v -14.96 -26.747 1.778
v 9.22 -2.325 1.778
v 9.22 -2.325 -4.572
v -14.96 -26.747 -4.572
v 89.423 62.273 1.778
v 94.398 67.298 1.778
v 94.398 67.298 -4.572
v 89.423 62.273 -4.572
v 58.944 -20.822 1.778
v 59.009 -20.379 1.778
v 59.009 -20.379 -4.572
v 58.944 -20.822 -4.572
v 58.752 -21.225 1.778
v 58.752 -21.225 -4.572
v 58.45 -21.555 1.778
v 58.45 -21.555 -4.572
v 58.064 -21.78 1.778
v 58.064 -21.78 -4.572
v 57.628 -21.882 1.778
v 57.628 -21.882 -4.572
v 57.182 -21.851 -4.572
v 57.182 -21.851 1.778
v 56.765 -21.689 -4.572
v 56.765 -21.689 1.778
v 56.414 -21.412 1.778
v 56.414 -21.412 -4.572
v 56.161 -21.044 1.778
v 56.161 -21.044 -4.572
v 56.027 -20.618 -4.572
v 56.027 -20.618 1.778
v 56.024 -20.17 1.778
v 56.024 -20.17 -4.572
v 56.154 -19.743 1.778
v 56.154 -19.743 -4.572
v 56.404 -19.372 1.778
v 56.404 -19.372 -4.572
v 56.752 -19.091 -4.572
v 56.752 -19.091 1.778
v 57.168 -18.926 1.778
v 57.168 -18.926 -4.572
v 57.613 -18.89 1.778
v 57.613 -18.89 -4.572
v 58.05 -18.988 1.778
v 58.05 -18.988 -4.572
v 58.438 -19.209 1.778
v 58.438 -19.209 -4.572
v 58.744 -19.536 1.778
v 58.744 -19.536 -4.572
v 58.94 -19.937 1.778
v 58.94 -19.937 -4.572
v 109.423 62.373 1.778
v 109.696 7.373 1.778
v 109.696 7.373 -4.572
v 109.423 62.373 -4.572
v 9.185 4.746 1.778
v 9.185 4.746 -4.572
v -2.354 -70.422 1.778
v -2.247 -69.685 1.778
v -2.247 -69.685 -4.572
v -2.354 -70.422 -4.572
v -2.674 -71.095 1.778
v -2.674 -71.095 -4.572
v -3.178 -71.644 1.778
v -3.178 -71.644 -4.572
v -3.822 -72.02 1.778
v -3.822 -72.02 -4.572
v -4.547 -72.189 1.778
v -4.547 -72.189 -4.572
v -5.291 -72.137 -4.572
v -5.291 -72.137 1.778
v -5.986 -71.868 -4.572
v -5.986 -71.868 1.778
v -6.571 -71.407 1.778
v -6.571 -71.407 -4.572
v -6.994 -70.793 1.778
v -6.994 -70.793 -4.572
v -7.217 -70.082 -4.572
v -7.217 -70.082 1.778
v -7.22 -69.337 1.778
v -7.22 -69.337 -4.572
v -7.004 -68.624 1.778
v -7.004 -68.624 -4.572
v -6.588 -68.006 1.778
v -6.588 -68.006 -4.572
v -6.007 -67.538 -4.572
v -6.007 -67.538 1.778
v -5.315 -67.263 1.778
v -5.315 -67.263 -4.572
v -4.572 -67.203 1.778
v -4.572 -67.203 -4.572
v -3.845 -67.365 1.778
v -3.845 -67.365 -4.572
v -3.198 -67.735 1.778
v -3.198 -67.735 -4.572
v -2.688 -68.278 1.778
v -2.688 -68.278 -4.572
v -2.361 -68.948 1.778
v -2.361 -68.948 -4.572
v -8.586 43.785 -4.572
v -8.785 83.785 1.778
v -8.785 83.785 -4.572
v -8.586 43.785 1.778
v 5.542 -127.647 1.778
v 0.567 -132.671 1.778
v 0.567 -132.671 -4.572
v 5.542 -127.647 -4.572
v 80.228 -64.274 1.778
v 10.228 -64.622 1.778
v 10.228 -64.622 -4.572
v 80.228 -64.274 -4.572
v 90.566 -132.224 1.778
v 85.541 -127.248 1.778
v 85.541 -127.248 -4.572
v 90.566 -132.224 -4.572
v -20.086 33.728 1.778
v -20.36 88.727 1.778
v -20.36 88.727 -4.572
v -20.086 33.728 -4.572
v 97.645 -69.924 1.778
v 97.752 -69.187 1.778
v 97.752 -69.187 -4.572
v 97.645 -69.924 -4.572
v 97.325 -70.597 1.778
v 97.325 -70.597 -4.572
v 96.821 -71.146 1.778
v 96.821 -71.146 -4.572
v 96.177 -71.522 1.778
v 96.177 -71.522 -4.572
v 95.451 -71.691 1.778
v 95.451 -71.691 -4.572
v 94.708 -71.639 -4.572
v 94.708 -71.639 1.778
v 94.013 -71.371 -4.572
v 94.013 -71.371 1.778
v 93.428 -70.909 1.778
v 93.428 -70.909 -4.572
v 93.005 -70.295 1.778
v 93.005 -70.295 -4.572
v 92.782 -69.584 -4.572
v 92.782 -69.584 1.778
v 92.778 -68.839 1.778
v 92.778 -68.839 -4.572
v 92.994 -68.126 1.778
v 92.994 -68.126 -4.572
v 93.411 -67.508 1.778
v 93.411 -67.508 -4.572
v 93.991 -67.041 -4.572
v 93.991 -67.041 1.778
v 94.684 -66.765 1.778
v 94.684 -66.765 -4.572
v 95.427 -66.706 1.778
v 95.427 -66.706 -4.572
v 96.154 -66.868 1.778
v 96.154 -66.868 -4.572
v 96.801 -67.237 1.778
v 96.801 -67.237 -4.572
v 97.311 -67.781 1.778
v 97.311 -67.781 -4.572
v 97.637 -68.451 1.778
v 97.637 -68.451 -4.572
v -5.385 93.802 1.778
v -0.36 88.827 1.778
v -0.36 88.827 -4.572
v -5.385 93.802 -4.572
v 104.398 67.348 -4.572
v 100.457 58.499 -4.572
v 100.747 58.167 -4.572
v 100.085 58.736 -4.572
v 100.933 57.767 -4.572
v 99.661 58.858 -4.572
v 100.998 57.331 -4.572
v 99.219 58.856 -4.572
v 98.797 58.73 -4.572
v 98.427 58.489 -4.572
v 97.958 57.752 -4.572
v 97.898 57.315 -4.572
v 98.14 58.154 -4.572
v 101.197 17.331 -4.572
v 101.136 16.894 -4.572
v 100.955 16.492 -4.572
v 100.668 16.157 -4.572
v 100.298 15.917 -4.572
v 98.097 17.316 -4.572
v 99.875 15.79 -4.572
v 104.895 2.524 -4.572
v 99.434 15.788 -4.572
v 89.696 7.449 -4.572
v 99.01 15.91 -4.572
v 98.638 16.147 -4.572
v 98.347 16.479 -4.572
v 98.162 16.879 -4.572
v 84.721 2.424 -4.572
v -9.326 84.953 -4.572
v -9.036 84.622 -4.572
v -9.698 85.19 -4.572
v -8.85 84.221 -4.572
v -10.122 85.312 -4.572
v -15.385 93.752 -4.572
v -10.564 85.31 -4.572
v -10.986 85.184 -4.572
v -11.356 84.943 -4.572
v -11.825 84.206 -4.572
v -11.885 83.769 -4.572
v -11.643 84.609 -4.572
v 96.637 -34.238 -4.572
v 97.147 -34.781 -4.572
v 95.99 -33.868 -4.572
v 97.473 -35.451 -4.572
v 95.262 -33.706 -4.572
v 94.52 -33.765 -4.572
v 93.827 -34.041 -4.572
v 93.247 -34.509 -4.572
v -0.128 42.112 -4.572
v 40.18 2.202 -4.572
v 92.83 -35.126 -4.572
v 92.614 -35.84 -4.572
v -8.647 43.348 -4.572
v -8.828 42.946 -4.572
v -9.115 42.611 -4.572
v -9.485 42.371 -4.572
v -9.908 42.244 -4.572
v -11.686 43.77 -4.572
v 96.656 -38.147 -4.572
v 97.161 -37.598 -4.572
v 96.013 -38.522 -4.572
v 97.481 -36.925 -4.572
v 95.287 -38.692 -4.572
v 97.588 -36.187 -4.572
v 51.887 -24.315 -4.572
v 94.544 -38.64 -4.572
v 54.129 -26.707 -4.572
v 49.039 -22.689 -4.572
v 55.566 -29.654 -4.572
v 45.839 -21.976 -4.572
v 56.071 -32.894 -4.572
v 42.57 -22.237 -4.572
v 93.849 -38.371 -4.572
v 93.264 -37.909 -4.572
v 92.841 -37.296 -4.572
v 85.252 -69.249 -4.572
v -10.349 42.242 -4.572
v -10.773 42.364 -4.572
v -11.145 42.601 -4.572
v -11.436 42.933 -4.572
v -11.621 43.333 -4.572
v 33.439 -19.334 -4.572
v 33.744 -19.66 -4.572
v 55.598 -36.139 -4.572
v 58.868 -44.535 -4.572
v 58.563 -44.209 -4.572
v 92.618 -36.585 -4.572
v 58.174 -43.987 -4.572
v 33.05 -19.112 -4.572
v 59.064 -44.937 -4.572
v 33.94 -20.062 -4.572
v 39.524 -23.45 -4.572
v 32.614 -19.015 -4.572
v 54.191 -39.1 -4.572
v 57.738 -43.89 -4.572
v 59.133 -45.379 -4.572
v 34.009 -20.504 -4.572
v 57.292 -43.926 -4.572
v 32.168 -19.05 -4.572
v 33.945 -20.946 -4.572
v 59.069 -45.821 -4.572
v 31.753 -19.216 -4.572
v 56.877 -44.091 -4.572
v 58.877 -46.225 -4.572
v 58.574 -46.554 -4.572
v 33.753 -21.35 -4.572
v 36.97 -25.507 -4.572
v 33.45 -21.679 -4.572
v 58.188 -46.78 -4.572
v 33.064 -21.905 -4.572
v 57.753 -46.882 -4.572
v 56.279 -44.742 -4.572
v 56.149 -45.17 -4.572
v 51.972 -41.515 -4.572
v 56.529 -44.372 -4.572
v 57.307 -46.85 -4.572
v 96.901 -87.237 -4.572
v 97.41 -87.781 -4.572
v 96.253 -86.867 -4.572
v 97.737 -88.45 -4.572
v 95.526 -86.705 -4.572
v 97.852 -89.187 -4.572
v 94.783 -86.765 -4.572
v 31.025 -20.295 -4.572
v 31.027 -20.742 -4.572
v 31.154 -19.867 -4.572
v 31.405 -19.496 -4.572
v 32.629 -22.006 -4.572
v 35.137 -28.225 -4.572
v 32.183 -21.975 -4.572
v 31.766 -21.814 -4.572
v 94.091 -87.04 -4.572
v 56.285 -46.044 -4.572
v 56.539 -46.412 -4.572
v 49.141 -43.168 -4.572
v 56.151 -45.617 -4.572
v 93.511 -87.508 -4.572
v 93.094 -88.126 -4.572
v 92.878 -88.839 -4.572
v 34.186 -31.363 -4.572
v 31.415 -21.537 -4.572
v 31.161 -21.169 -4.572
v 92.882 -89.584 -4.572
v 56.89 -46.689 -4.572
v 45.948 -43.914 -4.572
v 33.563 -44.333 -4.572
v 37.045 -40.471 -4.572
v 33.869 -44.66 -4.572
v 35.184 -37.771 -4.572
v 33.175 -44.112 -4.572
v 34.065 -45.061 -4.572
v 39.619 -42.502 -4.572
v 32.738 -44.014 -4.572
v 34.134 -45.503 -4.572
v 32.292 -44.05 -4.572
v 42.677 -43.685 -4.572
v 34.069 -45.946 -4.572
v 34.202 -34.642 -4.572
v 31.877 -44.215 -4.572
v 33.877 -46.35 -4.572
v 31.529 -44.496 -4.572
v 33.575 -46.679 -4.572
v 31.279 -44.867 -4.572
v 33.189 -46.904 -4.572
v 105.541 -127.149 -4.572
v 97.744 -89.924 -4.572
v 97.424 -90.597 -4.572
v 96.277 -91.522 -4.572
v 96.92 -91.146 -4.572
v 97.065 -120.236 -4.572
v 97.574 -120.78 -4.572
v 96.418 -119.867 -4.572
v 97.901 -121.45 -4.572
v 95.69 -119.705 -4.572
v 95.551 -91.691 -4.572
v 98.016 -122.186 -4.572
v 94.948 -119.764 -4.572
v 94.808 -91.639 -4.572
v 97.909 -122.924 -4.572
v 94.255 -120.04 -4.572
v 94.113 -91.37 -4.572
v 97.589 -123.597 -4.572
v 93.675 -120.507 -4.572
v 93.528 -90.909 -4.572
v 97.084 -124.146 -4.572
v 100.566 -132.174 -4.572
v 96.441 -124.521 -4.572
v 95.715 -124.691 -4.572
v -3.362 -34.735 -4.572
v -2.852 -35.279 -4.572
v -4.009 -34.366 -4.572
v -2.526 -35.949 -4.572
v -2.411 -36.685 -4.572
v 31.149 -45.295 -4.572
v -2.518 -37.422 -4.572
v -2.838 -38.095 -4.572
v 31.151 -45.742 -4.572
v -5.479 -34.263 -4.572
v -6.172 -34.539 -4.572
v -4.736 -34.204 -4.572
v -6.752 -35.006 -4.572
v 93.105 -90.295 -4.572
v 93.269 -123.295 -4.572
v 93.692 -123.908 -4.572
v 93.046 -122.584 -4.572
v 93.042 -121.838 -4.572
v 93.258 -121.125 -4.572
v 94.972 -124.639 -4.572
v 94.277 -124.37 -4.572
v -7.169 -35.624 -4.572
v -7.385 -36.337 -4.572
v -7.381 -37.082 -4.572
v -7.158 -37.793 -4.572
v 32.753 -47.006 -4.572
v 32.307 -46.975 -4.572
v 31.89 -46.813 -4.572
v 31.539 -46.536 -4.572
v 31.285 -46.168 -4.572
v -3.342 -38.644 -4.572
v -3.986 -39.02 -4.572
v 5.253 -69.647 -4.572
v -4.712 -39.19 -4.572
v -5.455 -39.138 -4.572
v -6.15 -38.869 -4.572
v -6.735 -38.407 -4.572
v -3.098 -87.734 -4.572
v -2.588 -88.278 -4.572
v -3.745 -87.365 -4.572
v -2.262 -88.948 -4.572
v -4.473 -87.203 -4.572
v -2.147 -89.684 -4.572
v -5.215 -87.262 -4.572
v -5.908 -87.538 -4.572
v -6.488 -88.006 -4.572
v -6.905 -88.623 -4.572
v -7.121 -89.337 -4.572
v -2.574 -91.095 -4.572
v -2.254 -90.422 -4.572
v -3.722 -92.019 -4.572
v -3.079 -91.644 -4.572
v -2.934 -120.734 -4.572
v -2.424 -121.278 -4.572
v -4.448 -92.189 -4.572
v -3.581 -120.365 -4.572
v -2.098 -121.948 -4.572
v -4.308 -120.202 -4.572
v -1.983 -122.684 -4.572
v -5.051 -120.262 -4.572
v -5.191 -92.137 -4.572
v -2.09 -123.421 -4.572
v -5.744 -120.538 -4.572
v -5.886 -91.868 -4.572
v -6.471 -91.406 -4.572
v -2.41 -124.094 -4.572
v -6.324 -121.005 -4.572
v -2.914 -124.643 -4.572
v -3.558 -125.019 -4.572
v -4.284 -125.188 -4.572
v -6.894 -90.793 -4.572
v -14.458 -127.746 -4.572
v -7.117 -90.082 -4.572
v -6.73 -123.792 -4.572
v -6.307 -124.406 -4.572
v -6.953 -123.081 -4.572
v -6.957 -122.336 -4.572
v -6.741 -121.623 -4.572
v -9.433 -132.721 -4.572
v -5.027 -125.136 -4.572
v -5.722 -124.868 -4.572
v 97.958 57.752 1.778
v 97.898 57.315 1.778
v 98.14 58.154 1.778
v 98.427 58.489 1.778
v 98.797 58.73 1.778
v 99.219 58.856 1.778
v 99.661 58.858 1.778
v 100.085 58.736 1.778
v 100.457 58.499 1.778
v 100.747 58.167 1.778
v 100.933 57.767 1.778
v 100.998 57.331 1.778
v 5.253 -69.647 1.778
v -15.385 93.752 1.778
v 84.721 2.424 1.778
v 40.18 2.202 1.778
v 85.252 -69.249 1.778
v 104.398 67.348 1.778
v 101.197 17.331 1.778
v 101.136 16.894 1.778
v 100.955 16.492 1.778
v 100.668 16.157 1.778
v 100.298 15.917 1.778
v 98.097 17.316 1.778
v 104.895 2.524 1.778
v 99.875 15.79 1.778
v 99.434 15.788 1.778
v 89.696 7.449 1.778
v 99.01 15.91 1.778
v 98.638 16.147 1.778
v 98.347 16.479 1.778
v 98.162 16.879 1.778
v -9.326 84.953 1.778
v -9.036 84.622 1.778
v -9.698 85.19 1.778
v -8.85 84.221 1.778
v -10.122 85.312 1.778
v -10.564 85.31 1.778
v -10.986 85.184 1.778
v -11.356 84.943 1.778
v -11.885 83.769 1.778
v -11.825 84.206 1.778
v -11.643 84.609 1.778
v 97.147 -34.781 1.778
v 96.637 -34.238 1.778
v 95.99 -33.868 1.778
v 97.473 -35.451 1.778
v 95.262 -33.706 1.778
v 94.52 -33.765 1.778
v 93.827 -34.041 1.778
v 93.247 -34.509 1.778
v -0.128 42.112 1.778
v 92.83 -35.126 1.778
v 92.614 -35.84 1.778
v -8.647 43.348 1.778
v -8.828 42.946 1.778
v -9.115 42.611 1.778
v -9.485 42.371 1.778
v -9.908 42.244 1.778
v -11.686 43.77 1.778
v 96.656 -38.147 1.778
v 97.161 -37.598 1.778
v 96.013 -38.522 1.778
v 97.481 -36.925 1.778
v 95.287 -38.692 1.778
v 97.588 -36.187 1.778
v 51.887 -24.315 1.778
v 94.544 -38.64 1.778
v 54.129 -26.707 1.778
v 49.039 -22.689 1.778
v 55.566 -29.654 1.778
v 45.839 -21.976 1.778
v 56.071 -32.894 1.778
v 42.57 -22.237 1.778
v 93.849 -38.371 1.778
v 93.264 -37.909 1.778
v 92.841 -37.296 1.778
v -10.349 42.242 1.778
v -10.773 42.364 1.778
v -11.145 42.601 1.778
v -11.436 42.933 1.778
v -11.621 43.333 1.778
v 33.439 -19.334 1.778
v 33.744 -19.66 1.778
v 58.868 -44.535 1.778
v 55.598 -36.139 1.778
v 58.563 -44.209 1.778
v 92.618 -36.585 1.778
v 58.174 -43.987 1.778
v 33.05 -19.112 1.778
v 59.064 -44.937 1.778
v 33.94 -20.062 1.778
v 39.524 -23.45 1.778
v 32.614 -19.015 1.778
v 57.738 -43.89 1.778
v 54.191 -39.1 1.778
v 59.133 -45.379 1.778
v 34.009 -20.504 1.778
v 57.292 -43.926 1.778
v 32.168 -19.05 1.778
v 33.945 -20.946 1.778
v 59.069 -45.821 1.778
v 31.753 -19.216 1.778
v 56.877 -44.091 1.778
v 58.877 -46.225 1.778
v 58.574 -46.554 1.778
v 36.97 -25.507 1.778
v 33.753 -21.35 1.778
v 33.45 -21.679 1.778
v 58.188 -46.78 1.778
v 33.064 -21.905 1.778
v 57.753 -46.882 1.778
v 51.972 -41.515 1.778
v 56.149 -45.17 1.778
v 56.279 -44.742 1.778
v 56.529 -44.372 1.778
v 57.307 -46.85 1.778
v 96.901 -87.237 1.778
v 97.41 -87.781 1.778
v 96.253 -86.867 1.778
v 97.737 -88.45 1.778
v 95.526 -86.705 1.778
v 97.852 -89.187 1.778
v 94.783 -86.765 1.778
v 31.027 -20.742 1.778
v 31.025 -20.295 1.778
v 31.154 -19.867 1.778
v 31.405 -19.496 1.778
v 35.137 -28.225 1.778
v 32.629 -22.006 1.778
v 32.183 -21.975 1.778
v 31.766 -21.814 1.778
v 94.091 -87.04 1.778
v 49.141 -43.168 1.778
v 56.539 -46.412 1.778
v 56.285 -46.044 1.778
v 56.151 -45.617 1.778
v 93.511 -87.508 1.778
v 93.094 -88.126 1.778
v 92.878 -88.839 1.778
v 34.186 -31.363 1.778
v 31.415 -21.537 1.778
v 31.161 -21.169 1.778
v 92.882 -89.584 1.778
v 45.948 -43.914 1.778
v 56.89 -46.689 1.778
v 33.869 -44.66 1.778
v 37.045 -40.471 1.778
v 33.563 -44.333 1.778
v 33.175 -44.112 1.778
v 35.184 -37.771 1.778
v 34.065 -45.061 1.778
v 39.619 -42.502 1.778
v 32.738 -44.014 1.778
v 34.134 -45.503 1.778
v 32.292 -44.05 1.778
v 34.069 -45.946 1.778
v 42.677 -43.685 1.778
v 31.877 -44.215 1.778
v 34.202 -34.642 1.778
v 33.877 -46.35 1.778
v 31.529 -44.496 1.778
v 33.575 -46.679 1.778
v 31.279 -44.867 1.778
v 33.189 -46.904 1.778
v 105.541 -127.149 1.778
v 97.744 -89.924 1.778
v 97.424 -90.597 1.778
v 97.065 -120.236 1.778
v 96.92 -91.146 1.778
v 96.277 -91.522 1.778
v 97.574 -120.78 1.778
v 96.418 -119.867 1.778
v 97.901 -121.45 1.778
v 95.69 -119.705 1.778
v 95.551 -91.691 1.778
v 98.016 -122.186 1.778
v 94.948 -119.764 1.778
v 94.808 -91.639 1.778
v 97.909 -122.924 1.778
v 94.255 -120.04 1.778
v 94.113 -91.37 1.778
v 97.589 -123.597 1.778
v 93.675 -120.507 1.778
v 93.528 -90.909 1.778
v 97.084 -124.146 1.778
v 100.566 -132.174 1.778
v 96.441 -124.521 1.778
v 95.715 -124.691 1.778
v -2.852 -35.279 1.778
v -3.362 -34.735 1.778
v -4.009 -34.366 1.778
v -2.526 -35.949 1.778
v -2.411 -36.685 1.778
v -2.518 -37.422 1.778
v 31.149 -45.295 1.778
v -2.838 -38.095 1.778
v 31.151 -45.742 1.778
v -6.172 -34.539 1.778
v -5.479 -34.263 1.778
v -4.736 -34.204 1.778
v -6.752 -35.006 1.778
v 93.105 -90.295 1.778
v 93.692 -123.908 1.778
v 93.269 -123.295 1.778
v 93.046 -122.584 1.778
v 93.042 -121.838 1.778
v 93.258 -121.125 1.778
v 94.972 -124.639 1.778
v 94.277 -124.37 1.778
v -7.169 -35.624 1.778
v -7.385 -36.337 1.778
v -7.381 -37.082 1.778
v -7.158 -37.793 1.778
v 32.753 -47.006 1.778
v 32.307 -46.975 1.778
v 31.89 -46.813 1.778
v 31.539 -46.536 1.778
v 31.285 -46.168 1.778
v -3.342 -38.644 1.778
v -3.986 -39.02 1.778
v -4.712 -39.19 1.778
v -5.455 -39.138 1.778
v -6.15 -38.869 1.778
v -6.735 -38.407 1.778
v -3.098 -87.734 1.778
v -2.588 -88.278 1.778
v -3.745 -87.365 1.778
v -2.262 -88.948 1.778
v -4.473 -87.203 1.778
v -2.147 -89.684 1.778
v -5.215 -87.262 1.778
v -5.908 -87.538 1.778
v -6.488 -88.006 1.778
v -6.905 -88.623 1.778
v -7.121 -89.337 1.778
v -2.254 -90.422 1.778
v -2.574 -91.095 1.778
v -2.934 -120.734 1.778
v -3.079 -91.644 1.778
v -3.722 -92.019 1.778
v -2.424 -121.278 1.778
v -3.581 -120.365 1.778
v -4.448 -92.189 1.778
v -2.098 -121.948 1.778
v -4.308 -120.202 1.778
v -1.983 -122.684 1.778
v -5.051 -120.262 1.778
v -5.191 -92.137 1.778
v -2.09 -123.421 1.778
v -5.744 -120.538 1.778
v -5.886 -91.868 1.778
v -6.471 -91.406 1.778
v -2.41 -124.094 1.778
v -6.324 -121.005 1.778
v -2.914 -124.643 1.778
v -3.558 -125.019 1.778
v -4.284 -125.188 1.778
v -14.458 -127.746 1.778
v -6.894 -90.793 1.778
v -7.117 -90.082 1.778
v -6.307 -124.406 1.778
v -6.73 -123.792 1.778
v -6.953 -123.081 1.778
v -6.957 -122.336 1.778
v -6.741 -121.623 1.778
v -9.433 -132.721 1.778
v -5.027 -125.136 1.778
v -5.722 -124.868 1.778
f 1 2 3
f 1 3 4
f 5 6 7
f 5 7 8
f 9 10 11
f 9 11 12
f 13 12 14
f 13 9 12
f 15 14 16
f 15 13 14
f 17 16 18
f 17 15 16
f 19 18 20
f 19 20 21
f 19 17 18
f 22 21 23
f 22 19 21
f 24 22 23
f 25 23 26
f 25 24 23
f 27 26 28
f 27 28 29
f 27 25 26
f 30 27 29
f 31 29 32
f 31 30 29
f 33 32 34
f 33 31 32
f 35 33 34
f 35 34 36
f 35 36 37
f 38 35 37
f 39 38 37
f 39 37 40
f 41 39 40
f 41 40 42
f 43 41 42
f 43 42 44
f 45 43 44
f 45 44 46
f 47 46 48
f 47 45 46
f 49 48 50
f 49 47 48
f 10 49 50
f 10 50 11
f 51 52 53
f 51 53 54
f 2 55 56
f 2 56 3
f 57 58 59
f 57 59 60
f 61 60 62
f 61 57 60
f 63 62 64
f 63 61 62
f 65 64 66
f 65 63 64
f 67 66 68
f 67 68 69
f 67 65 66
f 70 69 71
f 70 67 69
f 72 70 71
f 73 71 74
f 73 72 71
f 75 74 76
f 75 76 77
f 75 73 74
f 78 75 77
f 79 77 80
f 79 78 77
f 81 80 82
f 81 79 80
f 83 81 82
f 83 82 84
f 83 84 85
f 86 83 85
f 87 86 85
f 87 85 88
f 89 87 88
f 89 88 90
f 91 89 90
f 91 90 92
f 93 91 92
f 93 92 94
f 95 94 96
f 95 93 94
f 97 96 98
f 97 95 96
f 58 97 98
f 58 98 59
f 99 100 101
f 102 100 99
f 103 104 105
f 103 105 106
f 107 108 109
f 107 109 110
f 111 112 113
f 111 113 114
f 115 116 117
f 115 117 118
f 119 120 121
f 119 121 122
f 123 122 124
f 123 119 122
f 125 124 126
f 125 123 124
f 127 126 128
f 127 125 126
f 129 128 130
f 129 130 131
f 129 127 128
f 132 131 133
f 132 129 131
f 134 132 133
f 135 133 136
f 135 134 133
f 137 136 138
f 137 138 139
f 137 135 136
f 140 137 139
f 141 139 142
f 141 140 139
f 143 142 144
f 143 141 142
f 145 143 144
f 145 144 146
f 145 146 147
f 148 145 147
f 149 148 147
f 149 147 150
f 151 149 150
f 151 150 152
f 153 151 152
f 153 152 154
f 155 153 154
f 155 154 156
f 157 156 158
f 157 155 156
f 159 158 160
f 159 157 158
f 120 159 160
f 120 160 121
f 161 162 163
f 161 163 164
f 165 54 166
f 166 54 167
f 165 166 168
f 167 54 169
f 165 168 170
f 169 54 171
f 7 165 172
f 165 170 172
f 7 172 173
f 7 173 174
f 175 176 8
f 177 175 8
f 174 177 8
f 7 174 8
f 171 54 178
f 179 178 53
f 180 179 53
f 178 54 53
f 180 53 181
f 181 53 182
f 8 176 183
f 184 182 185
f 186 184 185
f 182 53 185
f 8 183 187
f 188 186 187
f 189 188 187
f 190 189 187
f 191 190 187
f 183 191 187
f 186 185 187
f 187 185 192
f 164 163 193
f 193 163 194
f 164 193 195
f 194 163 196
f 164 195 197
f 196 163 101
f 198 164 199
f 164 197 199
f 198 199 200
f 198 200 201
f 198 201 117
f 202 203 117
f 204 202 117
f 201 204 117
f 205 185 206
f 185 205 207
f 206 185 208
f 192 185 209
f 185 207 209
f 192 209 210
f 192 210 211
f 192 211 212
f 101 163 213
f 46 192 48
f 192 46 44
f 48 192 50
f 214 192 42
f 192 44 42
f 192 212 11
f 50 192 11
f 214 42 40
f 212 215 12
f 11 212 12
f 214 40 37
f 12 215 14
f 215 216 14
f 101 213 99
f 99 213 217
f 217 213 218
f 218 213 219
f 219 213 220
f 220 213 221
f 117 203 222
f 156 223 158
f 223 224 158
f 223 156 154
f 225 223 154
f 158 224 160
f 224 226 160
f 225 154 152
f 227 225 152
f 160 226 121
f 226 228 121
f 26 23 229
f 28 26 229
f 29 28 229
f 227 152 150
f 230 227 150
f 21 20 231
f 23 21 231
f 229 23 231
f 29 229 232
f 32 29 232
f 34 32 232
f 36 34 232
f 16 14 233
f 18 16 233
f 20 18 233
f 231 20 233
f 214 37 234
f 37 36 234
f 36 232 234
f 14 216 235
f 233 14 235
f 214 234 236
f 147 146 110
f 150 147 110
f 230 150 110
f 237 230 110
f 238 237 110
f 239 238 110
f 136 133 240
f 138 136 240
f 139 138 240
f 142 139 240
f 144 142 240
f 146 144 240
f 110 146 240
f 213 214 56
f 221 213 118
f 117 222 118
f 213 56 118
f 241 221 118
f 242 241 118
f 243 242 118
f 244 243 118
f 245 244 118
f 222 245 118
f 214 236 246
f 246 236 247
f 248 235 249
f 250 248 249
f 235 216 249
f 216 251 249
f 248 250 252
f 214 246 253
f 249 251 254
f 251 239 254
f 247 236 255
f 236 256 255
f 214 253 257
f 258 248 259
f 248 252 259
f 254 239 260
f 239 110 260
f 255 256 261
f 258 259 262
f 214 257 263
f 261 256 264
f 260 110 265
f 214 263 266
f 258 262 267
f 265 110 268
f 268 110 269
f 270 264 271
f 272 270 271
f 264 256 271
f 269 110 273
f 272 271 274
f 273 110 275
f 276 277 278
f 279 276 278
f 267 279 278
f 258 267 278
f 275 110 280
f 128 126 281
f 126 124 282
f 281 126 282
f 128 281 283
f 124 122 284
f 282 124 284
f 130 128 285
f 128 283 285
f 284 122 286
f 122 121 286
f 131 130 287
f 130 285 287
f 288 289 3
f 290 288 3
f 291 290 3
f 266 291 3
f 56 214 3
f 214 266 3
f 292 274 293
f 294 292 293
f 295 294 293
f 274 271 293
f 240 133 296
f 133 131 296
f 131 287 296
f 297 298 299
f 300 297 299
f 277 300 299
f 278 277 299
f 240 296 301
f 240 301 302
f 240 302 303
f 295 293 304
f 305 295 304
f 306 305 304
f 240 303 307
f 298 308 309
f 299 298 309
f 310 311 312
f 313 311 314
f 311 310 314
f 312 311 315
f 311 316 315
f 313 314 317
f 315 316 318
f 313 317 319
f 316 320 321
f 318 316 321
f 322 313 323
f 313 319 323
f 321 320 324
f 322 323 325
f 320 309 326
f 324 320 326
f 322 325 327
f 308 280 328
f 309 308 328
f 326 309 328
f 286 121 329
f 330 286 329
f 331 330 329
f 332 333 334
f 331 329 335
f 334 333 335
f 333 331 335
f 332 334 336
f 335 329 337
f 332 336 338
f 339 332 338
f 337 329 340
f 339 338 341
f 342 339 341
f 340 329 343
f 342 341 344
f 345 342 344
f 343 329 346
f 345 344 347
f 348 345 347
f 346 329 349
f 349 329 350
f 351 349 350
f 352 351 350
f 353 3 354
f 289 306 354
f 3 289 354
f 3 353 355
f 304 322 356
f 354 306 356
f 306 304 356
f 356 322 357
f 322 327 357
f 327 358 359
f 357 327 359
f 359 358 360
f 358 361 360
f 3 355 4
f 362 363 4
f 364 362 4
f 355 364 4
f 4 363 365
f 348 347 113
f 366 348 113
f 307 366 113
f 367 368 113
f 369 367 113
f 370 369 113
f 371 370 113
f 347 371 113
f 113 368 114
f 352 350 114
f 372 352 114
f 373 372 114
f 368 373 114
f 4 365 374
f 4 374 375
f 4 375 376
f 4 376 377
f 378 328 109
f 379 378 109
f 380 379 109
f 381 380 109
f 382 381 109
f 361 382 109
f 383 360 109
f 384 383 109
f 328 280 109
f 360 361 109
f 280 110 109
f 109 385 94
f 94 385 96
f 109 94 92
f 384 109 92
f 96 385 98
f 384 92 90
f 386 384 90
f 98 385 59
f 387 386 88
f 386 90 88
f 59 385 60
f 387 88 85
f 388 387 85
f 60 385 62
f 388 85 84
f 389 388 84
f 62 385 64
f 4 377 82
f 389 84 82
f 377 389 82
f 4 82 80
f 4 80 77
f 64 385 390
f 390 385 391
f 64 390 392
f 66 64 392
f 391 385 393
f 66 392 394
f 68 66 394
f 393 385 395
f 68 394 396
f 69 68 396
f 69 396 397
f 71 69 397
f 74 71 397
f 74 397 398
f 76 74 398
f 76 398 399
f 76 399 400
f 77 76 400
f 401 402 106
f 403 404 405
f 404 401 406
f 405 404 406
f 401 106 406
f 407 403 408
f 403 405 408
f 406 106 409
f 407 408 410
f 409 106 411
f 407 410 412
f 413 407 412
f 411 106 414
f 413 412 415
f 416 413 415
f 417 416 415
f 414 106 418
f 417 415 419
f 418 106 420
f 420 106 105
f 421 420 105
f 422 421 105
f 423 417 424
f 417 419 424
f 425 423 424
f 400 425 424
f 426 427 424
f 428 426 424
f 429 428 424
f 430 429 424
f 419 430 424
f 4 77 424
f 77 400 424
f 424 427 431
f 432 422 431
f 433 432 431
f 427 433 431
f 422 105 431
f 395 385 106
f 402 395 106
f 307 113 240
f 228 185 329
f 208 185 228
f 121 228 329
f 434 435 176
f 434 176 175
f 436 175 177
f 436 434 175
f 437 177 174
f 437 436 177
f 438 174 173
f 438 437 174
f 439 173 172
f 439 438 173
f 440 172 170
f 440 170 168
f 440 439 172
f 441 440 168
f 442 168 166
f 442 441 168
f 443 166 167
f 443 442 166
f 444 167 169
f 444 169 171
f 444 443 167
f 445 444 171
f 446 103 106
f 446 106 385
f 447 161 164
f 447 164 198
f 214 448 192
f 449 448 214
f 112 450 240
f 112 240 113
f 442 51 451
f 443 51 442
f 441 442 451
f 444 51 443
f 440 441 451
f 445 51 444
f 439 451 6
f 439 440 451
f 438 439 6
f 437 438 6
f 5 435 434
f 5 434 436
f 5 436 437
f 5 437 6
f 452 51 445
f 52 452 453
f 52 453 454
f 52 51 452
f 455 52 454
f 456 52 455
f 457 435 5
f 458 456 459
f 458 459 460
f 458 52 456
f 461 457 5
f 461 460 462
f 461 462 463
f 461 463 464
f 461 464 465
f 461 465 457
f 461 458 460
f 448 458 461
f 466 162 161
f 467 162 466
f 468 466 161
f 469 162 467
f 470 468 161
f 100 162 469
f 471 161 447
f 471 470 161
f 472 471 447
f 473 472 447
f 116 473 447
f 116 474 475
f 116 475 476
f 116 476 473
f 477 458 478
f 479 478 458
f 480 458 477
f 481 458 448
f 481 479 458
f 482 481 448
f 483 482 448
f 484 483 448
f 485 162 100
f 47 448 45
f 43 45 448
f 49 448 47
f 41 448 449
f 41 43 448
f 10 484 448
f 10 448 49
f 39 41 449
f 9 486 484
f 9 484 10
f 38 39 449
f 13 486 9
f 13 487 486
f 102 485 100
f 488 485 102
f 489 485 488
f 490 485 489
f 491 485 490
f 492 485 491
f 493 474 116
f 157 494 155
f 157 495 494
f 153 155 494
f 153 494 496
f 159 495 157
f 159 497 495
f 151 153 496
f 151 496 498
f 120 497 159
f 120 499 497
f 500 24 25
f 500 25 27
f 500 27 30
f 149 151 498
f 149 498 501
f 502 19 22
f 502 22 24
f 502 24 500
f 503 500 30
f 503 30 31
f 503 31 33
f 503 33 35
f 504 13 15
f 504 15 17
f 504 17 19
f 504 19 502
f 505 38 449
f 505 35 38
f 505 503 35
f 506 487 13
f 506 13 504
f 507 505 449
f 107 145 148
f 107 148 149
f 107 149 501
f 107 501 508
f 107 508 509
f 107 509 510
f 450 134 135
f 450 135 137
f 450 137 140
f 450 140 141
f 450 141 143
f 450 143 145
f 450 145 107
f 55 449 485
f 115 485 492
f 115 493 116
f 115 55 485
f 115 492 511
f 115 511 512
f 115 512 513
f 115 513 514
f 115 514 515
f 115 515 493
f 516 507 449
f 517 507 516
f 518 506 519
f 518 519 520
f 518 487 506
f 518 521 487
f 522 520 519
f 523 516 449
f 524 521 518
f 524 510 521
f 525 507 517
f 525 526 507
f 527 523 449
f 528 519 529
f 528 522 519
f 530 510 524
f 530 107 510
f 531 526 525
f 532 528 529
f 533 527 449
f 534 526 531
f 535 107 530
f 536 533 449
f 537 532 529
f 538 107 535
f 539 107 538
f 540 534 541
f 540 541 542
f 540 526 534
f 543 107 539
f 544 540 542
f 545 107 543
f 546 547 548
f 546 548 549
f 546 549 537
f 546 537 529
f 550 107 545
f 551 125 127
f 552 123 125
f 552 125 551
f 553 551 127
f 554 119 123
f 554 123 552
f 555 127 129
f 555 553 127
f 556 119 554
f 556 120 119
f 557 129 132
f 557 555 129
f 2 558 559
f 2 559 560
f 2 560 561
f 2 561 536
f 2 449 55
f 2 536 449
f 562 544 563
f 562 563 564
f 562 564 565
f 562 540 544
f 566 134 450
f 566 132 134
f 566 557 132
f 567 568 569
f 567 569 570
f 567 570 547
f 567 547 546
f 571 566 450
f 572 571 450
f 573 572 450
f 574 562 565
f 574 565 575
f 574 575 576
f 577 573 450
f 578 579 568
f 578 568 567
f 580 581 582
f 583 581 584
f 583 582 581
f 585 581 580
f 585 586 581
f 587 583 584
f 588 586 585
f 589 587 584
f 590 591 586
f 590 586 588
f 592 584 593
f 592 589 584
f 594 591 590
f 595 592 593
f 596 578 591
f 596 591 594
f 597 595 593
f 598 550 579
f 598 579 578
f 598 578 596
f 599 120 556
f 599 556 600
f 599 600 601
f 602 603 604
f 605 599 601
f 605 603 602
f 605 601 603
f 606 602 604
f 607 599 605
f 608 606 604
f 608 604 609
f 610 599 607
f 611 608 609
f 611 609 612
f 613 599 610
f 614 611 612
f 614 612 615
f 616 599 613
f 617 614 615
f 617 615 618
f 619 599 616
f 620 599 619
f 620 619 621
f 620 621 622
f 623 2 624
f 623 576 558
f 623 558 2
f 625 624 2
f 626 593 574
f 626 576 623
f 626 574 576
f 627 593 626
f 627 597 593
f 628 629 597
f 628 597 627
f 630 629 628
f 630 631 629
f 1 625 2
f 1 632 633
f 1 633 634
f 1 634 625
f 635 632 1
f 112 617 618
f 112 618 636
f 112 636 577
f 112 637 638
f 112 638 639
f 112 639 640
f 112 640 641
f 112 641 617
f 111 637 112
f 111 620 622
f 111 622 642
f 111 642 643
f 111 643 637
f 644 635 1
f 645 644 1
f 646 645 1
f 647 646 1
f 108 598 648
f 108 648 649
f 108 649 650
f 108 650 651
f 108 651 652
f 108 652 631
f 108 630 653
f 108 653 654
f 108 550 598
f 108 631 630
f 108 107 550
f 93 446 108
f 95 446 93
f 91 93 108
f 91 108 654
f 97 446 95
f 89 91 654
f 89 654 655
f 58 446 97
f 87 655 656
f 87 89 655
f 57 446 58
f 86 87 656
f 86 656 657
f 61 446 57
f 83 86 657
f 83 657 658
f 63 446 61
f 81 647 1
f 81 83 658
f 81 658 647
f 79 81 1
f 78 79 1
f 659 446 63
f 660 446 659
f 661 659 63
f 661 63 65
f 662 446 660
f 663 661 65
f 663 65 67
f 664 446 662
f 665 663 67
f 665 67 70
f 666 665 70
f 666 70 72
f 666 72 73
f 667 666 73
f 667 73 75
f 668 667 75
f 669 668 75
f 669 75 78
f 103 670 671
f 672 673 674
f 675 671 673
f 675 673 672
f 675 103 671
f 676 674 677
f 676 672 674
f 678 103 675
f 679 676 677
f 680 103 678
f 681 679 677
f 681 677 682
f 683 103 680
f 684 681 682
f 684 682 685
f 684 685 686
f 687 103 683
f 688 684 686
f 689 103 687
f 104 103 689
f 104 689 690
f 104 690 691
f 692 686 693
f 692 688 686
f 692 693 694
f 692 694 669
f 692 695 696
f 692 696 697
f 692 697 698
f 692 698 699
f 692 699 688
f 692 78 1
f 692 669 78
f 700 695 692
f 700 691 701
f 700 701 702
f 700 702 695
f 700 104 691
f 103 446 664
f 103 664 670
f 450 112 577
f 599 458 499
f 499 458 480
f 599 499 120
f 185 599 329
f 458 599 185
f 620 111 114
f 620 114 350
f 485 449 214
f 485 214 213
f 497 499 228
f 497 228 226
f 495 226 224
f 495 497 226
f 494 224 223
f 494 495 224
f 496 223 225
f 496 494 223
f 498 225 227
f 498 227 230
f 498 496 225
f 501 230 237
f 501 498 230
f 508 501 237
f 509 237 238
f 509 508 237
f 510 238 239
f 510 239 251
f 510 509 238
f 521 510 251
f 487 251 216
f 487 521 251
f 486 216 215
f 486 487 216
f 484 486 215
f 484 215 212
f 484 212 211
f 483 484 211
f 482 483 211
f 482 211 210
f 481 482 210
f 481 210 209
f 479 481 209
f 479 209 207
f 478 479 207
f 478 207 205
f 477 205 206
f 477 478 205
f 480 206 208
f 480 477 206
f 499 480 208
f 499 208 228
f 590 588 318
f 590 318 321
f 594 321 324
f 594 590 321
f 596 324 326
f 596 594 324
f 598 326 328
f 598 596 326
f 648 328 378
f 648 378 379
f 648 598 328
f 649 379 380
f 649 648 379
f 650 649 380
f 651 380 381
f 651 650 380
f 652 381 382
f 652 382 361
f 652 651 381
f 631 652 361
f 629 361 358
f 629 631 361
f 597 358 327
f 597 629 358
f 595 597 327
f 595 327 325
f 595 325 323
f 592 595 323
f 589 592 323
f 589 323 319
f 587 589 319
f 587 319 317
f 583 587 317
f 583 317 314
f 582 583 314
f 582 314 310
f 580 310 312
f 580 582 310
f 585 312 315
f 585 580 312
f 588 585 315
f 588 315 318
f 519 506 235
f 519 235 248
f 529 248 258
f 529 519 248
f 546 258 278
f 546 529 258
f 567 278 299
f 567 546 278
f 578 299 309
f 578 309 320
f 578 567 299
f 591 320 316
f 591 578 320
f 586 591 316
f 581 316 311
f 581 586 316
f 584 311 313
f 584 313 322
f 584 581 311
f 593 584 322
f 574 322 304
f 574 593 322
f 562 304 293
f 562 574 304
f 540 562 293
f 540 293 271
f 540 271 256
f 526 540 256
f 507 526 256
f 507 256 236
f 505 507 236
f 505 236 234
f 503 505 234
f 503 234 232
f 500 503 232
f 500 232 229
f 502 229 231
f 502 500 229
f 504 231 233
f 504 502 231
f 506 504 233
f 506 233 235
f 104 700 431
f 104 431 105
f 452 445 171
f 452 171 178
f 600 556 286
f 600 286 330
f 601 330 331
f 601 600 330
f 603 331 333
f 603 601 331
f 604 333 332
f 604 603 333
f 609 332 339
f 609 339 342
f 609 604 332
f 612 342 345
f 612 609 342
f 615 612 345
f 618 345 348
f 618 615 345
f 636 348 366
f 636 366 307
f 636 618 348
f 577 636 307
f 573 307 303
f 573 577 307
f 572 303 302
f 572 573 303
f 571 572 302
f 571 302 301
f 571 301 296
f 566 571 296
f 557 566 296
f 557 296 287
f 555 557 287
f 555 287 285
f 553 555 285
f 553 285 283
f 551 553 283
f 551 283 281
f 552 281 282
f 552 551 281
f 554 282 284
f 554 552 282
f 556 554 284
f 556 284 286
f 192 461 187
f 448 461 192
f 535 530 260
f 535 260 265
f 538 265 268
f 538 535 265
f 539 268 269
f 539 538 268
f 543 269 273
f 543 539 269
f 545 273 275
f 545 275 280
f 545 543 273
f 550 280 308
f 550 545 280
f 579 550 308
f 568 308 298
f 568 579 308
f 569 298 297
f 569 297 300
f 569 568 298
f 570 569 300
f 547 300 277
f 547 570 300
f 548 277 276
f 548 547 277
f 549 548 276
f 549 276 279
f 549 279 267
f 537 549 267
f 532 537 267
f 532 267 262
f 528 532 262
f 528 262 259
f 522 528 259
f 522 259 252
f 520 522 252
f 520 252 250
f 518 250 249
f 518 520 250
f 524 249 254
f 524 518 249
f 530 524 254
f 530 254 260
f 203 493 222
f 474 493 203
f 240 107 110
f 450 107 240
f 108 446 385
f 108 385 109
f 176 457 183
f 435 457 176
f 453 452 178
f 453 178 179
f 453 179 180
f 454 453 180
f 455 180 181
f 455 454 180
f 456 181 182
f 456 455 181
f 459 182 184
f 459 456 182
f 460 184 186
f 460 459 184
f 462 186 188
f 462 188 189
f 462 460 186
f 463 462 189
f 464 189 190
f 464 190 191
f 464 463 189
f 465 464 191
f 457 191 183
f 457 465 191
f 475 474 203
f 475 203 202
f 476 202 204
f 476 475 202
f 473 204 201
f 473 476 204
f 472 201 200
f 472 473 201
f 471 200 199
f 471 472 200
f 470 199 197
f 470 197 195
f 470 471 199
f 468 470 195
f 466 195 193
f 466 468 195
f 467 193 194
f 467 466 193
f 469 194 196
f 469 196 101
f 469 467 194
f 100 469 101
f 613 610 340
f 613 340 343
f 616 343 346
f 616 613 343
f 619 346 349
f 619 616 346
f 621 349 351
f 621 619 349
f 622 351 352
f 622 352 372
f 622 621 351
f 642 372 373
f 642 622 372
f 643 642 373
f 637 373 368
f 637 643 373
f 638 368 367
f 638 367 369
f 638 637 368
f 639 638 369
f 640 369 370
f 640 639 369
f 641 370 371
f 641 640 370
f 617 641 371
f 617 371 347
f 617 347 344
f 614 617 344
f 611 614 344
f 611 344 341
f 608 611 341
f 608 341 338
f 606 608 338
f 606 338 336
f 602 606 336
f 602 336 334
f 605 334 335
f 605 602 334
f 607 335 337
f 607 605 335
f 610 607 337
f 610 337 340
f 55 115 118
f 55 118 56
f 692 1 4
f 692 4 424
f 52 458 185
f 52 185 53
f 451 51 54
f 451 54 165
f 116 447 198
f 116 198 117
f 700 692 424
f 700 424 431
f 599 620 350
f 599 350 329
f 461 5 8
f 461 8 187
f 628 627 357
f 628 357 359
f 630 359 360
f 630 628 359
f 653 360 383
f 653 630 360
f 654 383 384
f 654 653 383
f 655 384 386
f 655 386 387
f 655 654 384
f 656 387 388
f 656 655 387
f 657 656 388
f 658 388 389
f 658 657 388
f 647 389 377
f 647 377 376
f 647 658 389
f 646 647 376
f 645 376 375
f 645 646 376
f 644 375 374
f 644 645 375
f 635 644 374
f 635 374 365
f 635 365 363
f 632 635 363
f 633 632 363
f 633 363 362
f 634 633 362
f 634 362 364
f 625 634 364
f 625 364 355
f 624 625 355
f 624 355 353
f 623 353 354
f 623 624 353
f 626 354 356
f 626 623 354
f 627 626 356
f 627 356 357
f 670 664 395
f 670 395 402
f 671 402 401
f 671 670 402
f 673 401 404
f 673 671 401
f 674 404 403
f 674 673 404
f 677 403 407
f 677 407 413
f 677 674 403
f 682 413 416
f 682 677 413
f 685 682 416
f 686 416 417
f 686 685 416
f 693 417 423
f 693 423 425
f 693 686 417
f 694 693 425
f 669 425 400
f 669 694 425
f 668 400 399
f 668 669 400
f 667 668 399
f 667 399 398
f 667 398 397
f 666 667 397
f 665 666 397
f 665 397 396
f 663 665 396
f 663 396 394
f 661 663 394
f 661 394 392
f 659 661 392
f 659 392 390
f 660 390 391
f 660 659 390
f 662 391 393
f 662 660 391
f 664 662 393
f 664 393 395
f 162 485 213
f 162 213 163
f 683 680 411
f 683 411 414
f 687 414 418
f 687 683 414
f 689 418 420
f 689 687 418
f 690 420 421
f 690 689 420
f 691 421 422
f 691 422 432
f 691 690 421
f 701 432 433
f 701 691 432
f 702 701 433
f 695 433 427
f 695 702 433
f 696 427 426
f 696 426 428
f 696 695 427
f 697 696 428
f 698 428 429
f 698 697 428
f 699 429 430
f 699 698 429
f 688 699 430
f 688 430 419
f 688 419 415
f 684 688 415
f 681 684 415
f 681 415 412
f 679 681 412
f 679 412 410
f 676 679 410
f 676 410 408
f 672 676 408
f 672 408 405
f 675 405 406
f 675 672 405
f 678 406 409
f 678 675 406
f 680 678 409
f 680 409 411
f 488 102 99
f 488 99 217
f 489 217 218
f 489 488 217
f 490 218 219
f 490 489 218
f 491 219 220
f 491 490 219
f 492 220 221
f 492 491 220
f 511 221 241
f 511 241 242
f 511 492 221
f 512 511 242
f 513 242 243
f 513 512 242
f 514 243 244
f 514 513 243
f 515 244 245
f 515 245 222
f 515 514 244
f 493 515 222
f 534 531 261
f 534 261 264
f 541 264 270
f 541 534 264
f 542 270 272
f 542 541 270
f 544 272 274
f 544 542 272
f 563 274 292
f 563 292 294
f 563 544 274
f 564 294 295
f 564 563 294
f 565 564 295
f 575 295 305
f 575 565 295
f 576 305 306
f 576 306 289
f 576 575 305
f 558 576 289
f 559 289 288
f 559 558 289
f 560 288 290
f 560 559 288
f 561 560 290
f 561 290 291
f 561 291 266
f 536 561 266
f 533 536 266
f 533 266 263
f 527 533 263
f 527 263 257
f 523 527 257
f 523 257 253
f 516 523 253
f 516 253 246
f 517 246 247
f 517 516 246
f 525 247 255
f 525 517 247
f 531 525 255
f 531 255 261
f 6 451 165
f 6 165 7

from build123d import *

# Parameters (mm, degrees)
SKETCH015_R             = 2.5
SKETCH015_R_2           = 11
SKETCH015_R_3           = 1.5
PAD_DEPTH               = 6.35
BODY004_PLACEMENT_ANGLE = 0.285111


with BuildPart() as part:
    # Sketch015 → Pad (new body)
    with BuildSketch(Plane(origin=(0, 0, 0), x_dir=(1, 0, 0), z_dir=(0, 0, -1))):
        Polygon((-60, -6.5), (-60, 94.5), (-55, 99.5), (-45, 99.5), (-40, 94.5), (-40, 36.5), (-35, 31.5), (35, 31.5), (40, 36.5), (40, 94.5), (45, 99.5), (55, 99.5), (60, 94.5), (60, -35.175), (64.825, -40), (64.825, -95), (59.825, -100), (49.825, -100), (44.825, -95), (44.825, -40.175), (39.825, -35.175), (-4.715729, -35.175), (-44.825, -75.284271), (-44.825, -122), (-49.825, -127), (-59.825, -127), (-64.825, -122), (-64.825, -67), (-35.698034, -37.873034), (-35.698034, -30.801966), align=None)
        with Locations((-50, 89.5)):
            Circle(SKETCH015_R, mode=Mode.SUBTRACT)
        with Locations((-50, 36.5)):
            Circle(SKETCH015_R, mode=Mode.SUBTRACT)
        with Locations((50, 36.5)):
            Circle(SKETCH015_R, mode=Mode.SUBTRACT)
        Circle(SKETCH015_R_2, mode=Mode.SUBTRACT)
        with Locations((50, 89.5)):
            Circle(SKETCH015_R, mode=Mode.SUBTRACT)
        with Locations((-12.5, 12.5)):
            Circle(SKETCH015_R_3, mode=Mode.SUBTRACT)
        with Locations((12.5, 12.5)):
            Circle(SKETCH015_R_3, mode=Mode.SUBTRACT)
        with Locations((12.5, -12.5)):
            Circle(SKETCH015_R_3, mode=Mode.SUBTRACT)
        with Locations((-12.5, -12.5)):
            Circle(SKETCH015_R_3, mode=Mode.SUBTRACT)
        with Locations((-50, 3.5)):
            Circle(SKETCH015_R, mode=Mode.SUBTRACT)
        with Locations((-50, 56.5)):
            Circle(SKETCH015_R, mode=Mode.SUBTRACT)
        with Locations((50, 56.5)):
            Circle(SKETCH015_R, mode=Mode.SUBTRACT)
        with Locations((50, 3.5)):
            Circle(SKETCH015_R, mode=Mode.SUBTRACT)
        with BuildLine():
            ThreePointArc((-53.275, -77), (-54.825, -75.45), (-56.375, -77))
            Line((-56.375, -77), (-56.375, -117))
            ThreePointArc((-56.375, -117), (-54.825, -118.55), (-53.275, -117))
            Line((-53.275, -117), (-53.275, -77))
        make_face(mode=Mode.SUBTRACT)
        with BuildLine():
            ThreePointArc((56.375, -50), (54.825, -48.45), (53.275, -50))
            Line((53.275, -50), (53.275, -90))
            ThreePointArc((53.275, -90), (54.825, -91.55), (56.375, -90))
            Line((56.375, -90), (56.375, -50))
        make_face(mode=Mode.SUBTRACT)
    extrude(amount=PAD_DEPTH)


with BuildPart() as part_1:
    # Body004 placement: moved
    add(part.part.moved(Location((45.071194, -32.948698, 1.778014))).rotate(Axis((45.071194, -32.948698, 1.778014), (0, 0, 1)), BODY004_PLACEMENT_ANGLE))


solid = part_1.part
